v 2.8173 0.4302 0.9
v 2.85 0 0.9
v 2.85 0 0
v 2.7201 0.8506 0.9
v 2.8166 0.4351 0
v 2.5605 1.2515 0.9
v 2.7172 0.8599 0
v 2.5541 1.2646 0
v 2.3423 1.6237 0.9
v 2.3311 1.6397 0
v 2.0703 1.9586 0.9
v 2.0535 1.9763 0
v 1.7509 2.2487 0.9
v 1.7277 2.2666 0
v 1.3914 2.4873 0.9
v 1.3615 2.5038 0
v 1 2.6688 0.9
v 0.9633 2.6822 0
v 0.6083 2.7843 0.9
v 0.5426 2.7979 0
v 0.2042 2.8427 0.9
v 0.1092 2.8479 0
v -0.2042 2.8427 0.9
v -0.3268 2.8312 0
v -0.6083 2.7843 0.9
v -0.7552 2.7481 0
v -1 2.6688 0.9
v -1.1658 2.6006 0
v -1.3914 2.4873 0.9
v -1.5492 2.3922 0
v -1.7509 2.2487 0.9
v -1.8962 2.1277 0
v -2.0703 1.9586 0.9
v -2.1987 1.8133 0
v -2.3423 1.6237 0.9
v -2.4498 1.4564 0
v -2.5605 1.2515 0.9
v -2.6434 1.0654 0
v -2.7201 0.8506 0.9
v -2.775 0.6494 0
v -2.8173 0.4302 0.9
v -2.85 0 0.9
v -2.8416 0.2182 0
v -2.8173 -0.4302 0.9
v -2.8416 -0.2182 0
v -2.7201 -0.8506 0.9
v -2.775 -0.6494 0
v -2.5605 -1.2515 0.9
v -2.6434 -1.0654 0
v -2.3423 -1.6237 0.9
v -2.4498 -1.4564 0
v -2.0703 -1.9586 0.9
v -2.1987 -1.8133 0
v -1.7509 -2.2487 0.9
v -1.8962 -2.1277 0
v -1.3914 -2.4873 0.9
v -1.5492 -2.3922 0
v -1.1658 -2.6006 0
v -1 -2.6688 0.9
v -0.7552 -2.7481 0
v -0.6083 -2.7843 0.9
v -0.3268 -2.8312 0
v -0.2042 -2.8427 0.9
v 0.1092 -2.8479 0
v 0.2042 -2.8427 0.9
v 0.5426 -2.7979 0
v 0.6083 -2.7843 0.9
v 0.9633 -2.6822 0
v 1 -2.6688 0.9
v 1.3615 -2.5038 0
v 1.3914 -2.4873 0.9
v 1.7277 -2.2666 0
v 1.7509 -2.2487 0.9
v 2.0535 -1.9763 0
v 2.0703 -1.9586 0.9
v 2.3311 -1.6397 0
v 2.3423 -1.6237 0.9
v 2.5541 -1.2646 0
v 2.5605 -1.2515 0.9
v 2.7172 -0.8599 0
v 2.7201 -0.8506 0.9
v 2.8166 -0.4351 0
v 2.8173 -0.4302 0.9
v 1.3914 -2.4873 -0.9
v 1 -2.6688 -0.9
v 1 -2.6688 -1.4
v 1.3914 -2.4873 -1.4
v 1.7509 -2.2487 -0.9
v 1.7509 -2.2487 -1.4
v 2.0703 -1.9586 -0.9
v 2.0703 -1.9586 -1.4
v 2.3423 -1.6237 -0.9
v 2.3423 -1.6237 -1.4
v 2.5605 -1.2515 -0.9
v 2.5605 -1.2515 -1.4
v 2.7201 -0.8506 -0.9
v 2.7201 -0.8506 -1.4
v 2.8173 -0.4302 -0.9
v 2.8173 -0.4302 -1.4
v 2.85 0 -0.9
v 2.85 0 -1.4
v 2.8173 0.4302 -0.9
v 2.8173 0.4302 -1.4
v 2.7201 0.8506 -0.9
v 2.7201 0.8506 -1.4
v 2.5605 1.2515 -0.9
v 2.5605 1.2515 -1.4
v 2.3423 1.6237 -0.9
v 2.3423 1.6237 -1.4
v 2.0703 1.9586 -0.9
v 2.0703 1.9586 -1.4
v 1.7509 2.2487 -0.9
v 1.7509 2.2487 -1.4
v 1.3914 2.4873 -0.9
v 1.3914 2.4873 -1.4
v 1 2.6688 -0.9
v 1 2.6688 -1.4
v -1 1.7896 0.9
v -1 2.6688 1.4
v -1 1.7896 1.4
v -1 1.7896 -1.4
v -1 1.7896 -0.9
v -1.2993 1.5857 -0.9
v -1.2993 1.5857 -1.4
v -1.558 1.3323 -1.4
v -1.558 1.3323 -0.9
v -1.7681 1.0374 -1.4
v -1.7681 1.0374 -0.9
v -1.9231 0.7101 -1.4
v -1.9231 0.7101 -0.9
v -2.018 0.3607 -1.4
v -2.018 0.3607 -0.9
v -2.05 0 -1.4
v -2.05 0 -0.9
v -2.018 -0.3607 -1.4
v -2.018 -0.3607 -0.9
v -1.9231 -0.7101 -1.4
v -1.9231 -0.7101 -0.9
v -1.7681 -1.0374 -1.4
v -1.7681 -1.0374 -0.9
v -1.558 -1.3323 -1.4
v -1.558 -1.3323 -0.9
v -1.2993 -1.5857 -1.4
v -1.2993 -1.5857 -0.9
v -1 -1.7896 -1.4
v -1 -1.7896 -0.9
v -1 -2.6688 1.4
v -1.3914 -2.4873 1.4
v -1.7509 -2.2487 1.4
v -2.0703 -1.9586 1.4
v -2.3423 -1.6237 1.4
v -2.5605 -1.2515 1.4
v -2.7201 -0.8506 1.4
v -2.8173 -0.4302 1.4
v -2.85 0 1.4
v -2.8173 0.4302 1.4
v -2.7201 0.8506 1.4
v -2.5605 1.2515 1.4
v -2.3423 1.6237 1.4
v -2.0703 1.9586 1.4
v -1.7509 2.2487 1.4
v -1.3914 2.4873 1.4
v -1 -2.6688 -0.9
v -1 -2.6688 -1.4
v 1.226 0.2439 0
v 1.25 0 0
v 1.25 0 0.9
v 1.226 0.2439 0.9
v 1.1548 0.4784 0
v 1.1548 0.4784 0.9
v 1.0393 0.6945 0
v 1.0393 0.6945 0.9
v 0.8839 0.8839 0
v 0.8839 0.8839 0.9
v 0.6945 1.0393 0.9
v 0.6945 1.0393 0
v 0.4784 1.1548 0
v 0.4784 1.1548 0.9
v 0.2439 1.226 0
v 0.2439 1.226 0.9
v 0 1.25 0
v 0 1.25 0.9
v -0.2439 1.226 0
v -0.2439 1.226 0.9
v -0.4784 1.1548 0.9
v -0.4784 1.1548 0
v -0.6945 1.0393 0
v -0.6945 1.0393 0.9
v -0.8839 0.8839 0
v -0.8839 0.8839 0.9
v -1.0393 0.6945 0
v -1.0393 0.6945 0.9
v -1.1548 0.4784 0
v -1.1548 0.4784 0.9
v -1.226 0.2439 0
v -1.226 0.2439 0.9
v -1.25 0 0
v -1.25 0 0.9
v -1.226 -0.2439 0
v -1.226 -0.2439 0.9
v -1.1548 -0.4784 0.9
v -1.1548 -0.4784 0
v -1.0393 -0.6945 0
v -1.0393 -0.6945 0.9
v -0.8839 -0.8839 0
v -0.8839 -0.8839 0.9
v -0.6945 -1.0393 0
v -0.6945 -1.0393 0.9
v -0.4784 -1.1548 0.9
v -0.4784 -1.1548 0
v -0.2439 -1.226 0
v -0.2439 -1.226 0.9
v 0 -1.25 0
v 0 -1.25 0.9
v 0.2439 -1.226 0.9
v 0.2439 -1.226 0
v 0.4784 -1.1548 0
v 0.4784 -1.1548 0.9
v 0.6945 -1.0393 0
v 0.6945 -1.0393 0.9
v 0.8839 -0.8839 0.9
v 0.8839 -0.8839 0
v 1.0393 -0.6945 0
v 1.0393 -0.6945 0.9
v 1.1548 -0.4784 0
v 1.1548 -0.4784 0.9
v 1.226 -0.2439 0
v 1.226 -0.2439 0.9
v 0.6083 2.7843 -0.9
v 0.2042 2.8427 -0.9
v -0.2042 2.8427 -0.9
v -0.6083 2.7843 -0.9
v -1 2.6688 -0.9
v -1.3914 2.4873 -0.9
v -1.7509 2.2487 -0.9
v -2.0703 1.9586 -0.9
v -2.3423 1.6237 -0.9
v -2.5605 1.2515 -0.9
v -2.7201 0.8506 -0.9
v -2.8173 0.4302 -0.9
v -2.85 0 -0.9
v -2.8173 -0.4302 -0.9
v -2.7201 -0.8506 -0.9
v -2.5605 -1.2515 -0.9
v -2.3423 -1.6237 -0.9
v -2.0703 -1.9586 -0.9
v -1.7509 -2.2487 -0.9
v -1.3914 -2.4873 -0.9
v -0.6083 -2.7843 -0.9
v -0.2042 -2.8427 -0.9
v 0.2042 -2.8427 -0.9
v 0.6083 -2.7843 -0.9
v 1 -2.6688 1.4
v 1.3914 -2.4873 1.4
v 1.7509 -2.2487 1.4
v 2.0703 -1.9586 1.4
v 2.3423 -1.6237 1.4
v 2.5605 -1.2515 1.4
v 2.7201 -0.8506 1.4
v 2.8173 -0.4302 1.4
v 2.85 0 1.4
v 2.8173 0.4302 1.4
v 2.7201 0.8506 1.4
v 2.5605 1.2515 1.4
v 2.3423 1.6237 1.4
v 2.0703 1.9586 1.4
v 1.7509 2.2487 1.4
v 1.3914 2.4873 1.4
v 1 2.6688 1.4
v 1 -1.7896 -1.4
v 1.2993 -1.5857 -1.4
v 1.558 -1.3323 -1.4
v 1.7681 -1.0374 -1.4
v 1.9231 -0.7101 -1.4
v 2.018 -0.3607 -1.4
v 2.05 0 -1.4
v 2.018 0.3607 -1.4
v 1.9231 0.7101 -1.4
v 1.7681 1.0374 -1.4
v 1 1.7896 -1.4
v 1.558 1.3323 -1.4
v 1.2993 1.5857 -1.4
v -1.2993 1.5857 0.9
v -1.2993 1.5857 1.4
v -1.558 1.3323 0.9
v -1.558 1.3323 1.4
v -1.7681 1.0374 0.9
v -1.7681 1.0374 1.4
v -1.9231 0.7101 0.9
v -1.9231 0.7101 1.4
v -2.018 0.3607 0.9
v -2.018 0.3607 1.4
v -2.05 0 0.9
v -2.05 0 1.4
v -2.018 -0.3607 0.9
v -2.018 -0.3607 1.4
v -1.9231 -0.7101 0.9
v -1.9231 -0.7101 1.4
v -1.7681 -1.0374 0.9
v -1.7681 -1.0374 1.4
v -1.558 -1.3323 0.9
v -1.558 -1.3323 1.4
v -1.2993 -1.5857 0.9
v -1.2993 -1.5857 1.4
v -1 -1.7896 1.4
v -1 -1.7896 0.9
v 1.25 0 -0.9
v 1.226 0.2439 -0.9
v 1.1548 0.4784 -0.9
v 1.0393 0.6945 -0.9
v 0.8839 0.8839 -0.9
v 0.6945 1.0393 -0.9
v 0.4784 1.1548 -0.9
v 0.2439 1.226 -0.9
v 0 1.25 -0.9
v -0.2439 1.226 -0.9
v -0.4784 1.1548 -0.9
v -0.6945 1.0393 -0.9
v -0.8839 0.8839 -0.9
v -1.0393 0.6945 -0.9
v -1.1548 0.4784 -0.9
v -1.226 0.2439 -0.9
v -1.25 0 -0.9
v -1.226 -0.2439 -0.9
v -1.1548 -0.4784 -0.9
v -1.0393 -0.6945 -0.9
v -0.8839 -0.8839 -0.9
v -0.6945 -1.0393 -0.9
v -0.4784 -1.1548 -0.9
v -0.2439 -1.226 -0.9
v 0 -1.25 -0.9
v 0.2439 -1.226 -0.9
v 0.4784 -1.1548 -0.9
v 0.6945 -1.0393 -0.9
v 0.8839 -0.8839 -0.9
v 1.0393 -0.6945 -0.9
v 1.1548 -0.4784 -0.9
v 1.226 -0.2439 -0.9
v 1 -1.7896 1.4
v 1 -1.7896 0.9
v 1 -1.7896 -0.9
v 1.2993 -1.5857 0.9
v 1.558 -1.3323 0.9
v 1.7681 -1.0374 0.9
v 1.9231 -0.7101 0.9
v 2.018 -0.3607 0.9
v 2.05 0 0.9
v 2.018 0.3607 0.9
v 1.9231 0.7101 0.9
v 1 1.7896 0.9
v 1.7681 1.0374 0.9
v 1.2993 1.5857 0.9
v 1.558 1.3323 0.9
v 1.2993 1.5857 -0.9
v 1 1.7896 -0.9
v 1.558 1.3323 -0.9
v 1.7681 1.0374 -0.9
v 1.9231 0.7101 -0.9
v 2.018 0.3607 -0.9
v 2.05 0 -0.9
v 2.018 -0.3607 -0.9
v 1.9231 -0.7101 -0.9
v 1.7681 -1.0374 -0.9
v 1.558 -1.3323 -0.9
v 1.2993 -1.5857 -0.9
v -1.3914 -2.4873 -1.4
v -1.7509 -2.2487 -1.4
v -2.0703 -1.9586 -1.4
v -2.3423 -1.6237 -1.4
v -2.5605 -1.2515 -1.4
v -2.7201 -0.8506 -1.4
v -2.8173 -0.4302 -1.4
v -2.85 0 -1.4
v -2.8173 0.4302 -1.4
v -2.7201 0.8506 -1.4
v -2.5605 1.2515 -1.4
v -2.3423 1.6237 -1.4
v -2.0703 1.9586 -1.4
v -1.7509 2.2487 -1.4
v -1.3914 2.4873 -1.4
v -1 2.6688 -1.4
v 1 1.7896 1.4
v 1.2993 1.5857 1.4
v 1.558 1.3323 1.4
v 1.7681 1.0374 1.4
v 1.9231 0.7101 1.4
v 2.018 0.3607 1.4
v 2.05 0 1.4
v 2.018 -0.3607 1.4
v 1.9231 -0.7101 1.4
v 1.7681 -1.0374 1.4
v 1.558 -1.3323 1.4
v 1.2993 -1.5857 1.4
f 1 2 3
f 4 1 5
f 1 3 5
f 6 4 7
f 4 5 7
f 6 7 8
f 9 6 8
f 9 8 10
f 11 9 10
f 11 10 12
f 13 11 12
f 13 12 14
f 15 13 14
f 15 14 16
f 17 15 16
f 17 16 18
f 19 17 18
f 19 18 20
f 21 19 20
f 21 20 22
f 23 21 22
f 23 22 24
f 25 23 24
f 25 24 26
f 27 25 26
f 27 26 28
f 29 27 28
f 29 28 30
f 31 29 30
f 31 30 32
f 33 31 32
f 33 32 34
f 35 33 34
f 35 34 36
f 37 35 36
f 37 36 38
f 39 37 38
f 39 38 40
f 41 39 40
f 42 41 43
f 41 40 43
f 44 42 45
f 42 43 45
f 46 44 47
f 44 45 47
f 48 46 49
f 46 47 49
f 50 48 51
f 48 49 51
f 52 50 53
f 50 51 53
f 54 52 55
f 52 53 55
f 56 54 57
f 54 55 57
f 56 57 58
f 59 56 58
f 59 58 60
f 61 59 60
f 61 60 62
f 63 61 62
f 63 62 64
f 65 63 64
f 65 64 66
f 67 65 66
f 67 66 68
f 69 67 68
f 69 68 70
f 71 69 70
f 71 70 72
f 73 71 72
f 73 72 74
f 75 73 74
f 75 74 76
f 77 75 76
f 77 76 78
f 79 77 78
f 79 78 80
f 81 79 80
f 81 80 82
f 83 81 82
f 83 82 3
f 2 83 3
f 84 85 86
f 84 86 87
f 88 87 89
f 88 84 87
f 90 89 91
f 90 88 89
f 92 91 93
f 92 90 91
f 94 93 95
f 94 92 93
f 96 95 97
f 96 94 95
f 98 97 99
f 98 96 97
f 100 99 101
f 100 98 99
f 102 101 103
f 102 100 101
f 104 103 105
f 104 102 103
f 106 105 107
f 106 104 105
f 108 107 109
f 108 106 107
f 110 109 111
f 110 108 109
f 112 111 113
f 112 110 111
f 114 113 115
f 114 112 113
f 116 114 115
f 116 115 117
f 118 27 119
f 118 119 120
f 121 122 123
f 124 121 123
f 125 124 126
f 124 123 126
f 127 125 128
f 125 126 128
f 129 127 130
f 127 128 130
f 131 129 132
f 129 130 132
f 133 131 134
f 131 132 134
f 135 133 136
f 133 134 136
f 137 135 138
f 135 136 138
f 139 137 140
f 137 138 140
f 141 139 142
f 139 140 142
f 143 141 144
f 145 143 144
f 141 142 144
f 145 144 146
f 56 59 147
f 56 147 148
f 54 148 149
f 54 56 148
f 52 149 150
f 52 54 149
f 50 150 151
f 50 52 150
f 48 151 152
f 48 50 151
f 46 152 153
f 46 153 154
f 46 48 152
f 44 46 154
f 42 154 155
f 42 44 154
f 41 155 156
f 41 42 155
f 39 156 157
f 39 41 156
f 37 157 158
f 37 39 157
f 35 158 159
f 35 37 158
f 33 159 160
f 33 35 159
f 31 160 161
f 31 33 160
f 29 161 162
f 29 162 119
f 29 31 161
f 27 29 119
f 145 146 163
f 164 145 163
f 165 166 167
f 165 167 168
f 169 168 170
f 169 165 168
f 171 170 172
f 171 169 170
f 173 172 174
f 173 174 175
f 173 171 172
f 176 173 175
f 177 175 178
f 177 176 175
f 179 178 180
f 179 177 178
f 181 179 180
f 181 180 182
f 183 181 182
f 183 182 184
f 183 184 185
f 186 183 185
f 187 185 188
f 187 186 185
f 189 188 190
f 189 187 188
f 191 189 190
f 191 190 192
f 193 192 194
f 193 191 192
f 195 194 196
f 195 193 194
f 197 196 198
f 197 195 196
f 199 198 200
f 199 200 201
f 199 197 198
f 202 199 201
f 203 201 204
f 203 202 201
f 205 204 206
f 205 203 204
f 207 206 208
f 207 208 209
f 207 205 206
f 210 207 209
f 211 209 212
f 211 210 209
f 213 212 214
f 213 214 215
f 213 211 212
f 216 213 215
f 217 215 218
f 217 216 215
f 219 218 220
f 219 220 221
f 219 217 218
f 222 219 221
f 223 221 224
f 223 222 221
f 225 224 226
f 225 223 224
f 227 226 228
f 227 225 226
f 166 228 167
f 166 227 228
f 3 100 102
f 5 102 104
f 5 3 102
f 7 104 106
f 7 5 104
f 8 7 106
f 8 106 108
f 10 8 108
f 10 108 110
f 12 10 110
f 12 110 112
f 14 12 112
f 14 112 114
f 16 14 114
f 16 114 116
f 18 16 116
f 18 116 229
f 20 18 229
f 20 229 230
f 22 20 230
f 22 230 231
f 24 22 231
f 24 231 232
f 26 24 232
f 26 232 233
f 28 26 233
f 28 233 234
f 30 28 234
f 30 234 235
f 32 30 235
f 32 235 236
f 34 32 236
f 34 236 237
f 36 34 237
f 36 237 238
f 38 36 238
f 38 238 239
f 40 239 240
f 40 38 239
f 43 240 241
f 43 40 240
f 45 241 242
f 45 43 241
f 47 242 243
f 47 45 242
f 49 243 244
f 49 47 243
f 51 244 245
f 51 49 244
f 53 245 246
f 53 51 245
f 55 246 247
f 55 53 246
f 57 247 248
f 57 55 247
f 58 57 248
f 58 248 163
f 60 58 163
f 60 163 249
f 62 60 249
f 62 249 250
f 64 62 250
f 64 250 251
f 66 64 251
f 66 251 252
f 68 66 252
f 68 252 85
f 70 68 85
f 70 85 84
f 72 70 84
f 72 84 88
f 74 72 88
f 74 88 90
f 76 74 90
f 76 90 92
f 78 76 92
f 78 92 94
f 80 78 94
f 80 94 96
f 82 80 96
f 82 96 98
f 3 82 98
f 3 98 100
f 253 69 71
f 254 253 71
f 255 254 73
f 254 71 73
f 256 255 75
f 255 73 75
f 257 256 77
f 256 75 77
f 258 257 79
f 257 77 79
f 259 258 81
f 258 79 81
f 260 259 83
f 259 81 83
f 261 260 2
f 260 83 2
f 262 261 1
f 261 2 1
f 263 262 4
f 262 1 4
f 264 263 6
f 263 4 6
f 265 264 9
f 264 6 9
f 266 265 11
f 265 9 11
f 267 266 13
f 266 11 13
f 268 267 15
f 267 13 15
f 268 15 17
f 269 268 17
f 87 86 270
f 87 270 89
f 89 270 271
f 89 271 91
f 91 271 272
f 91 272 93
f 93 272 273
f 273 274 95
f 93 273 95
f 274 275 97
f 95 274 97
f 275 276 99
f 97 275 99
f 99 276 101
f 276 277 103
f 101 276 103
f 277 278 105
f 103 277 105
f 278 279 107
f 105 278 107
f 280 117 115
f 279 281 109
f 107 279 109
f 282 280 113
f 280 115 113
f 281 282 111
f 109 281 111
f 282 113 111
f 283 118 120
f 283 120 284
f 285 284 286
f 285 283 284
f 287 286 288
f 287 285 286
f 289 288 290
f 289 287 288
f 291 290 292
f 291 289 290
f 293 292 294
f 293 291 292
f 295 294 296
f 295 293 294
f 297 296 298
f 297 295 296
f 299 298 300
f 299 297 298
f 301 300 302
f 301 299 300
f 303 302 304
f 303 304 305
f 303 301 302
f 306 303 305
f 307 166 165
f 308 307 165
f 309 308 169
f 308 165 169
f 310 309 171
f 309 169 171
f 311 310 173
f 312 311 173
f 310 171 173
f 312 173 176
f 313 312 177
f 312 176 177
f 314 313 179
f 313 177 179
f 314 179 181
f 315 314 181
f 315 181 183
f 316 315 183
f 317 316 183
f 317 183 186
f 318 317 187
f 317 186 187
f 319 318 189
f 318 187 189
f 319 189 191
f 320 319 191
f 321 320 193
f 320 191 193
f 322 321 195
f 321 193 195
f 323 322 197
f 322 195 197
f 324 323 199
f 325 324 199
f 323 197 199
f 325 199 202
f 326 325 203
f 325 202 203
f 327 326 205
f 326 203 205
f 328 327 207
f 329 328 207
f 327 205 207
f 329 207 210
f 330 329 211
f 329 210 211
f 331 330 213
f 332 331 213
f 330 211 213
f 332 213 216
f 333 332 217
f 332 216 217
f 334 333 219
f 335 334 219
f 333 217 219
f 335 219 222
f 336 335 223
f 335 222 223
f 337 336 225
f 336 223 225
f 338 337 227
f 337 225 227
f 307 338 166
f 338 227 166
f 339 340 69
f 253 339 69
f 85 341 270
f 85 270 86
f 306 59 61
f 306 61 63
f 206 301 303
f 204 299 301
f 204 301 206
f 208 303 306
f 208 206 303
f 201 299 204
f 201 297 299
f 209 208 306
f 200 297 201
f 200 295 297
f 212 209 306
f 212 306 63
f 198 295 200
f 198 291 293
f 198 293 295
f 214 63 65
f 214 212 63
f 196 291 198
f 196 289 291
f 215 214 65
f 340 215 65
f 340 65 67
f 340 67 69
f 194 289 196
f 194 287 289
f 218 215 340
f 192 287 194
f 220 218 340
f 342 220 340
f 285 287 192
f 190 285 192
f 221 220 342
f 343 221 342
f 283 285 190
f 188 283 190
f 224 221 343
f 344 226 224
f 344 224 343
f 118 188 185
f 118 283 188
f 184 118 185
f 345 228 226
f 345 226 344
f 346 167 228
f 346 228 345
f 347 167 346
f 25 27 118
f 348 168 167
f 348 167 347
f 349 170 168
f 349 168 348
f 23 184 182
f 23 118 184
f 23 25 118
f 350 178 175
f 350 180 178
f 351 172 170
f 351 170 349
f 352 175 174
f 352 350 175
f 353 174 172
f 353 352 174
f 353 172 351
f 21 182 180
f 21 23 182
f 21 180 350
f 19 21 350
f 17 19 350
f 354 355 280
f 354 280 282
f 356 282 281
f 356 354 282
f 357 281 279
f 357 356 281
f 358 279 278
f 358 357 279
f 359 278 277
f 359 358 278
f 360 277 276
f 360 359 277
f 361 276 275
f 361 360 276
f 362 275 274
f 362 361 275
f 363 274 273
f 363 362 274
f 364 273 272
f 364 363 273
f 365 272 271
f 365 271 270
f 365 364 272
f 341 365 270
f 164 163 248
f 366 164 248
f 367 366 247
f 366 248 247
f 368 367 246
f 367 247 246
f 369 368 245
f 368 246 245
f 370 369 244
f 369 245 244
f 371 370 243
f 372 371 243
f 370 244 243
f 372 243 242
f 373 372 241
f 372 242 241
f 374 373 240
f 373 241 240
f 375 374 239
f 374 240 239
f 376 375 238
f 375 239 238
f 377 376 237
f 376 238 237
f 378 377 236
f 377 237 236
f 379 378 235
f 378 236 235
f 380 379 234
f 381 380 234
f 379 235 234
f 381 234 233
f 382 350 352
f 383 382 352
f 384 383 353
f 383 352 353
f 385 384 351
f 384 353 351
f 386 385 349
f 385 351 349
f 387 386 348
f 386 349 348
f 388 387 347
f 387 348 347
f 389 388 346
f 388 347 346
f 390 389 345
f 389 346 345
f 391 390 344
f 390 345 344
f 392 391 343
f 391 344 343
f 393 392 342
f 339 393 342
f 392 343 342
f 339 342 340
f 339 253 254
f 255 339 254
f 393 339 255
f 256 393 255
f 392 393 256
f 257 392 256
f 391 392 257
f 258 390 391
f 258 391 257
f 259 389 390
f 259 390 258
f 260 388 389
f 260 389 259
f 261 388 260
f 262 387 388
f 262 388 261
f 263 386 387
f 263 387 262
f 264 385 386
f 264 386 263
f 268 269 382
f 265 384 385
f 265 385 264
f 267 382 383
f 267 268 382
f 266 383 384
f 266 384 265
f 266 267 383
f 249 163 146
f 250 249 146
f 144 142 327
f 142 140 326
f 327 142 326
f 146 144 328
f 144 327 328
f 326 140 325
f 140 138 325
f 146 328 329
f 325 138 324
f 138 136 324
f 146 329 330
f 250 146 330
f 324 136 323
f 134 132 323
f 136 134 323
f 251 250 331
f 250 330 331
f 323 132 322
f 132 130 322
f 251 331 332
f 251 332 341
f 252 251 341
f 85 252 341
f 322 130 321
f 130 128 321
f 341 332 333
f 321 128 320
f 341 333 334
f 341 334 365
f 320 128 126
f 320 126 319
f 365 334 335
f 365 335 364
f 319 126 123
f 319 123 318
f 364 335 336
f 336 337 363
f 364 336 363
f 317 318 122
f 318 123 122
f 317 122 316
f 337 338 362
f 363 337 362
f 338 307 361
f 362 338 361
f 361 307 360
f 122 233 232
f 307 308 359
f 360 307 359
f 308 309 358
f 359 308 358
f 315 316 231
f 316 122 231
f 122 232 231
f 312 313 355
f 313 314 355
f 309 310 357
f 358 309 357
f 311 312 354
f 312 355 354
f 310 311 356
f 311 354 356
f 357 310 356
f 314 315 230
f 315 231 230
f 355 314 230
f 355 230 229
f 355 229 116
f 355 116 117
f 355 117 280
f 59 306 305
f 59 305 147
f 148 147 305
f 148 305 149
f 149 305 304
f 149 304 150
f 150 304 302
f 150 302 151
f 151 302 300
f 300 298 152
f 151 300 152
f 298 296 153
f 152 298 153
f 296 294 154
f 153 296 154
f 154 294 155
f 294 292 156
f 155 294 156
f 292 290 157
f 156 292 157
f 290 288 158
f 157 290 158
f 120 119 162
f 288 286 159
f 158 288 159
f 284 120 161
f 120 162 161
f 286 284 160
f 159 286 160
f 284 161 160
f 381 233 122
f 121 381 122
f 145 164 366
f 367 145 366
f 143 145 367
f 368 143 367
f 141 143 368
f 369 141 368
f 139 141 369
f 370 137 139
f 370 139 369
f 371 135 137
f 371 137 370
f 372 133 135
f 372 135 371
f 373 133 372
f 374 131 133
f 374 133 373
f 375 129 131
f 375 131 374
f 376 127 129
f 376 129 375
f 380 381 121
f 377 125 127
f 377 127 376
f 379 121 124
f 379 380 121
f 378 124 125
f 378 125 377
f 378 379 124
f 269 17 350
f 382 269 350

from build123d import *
from build123d.topology import SkipClean

# Parameters (mm, degrees)
SKETCH_1_R      = 2.85
SKETCH_1_R_2    = 1.25
EXTRUDE_1_DEPTH = 0.9
EXTRUDE_2_DEPTH = 0.5


with BuildPart() as part:
    # ｽｹｯﾁ1 → ﾎﾞｽ - 押し出し1 (new body)
    with BuildSketch(Plane.XY):
        Circle(SKETCH_1_R)
        Circle(SKETCH_1_R_2, mode=Mode.SUBTRACT)
    extrude_1 = extrude(amount=EXTRUDE_1_DEPTH)

    # ｽｹｯﾁ2 → ﾎﾞｽ - 押し出し2 (add)
    with SkipClean():  # the faces are left unmerged after this step: merging them gives an invalid solid
        with BuildSketch(Plane.XY.offset(0.9)):
            with BuildLine():
                Line((-1, 2.668801229), (-1, 1.789553017))
                ThreePointArc((-1, 1.789553017), (-2.05, 0), (-1, -1.789553017))
                Line((-1, -1.789553017), (-1, -2.668801229))
                ThreePointArc((-1, -2.668801229), (-2.85, 0), (-1, 2.668801229))
            make_face()
            with BuildLine():
                Line((1, 2.668801229), (1, 1.789553017))
                ThreePointArc((1, 1.789553017), (2.05, 0), (1, -1.789553017))
                Line((1, -1.789553017), (1, -2.668801229))
                ThreePointArc((1, -2.668801229), (2.85, 0), (1, 2.668801229))
            make_face()
        extrude_2 = extrude(amount=EXTRUDE_2_DEPTH)

    # ﾐﾗｰ1: ﾎﾞｽ - 押し出し1, ﾎﾞｽ - 押し出し2 across plane
    with SkipClean():  # the faces are left unmerged after this step: merging them gives an invalid solid
        add(extrude_1.mirror(Plane.XY))
        add(extrude_2.mirror(Plane.XY))


solid = part.part
